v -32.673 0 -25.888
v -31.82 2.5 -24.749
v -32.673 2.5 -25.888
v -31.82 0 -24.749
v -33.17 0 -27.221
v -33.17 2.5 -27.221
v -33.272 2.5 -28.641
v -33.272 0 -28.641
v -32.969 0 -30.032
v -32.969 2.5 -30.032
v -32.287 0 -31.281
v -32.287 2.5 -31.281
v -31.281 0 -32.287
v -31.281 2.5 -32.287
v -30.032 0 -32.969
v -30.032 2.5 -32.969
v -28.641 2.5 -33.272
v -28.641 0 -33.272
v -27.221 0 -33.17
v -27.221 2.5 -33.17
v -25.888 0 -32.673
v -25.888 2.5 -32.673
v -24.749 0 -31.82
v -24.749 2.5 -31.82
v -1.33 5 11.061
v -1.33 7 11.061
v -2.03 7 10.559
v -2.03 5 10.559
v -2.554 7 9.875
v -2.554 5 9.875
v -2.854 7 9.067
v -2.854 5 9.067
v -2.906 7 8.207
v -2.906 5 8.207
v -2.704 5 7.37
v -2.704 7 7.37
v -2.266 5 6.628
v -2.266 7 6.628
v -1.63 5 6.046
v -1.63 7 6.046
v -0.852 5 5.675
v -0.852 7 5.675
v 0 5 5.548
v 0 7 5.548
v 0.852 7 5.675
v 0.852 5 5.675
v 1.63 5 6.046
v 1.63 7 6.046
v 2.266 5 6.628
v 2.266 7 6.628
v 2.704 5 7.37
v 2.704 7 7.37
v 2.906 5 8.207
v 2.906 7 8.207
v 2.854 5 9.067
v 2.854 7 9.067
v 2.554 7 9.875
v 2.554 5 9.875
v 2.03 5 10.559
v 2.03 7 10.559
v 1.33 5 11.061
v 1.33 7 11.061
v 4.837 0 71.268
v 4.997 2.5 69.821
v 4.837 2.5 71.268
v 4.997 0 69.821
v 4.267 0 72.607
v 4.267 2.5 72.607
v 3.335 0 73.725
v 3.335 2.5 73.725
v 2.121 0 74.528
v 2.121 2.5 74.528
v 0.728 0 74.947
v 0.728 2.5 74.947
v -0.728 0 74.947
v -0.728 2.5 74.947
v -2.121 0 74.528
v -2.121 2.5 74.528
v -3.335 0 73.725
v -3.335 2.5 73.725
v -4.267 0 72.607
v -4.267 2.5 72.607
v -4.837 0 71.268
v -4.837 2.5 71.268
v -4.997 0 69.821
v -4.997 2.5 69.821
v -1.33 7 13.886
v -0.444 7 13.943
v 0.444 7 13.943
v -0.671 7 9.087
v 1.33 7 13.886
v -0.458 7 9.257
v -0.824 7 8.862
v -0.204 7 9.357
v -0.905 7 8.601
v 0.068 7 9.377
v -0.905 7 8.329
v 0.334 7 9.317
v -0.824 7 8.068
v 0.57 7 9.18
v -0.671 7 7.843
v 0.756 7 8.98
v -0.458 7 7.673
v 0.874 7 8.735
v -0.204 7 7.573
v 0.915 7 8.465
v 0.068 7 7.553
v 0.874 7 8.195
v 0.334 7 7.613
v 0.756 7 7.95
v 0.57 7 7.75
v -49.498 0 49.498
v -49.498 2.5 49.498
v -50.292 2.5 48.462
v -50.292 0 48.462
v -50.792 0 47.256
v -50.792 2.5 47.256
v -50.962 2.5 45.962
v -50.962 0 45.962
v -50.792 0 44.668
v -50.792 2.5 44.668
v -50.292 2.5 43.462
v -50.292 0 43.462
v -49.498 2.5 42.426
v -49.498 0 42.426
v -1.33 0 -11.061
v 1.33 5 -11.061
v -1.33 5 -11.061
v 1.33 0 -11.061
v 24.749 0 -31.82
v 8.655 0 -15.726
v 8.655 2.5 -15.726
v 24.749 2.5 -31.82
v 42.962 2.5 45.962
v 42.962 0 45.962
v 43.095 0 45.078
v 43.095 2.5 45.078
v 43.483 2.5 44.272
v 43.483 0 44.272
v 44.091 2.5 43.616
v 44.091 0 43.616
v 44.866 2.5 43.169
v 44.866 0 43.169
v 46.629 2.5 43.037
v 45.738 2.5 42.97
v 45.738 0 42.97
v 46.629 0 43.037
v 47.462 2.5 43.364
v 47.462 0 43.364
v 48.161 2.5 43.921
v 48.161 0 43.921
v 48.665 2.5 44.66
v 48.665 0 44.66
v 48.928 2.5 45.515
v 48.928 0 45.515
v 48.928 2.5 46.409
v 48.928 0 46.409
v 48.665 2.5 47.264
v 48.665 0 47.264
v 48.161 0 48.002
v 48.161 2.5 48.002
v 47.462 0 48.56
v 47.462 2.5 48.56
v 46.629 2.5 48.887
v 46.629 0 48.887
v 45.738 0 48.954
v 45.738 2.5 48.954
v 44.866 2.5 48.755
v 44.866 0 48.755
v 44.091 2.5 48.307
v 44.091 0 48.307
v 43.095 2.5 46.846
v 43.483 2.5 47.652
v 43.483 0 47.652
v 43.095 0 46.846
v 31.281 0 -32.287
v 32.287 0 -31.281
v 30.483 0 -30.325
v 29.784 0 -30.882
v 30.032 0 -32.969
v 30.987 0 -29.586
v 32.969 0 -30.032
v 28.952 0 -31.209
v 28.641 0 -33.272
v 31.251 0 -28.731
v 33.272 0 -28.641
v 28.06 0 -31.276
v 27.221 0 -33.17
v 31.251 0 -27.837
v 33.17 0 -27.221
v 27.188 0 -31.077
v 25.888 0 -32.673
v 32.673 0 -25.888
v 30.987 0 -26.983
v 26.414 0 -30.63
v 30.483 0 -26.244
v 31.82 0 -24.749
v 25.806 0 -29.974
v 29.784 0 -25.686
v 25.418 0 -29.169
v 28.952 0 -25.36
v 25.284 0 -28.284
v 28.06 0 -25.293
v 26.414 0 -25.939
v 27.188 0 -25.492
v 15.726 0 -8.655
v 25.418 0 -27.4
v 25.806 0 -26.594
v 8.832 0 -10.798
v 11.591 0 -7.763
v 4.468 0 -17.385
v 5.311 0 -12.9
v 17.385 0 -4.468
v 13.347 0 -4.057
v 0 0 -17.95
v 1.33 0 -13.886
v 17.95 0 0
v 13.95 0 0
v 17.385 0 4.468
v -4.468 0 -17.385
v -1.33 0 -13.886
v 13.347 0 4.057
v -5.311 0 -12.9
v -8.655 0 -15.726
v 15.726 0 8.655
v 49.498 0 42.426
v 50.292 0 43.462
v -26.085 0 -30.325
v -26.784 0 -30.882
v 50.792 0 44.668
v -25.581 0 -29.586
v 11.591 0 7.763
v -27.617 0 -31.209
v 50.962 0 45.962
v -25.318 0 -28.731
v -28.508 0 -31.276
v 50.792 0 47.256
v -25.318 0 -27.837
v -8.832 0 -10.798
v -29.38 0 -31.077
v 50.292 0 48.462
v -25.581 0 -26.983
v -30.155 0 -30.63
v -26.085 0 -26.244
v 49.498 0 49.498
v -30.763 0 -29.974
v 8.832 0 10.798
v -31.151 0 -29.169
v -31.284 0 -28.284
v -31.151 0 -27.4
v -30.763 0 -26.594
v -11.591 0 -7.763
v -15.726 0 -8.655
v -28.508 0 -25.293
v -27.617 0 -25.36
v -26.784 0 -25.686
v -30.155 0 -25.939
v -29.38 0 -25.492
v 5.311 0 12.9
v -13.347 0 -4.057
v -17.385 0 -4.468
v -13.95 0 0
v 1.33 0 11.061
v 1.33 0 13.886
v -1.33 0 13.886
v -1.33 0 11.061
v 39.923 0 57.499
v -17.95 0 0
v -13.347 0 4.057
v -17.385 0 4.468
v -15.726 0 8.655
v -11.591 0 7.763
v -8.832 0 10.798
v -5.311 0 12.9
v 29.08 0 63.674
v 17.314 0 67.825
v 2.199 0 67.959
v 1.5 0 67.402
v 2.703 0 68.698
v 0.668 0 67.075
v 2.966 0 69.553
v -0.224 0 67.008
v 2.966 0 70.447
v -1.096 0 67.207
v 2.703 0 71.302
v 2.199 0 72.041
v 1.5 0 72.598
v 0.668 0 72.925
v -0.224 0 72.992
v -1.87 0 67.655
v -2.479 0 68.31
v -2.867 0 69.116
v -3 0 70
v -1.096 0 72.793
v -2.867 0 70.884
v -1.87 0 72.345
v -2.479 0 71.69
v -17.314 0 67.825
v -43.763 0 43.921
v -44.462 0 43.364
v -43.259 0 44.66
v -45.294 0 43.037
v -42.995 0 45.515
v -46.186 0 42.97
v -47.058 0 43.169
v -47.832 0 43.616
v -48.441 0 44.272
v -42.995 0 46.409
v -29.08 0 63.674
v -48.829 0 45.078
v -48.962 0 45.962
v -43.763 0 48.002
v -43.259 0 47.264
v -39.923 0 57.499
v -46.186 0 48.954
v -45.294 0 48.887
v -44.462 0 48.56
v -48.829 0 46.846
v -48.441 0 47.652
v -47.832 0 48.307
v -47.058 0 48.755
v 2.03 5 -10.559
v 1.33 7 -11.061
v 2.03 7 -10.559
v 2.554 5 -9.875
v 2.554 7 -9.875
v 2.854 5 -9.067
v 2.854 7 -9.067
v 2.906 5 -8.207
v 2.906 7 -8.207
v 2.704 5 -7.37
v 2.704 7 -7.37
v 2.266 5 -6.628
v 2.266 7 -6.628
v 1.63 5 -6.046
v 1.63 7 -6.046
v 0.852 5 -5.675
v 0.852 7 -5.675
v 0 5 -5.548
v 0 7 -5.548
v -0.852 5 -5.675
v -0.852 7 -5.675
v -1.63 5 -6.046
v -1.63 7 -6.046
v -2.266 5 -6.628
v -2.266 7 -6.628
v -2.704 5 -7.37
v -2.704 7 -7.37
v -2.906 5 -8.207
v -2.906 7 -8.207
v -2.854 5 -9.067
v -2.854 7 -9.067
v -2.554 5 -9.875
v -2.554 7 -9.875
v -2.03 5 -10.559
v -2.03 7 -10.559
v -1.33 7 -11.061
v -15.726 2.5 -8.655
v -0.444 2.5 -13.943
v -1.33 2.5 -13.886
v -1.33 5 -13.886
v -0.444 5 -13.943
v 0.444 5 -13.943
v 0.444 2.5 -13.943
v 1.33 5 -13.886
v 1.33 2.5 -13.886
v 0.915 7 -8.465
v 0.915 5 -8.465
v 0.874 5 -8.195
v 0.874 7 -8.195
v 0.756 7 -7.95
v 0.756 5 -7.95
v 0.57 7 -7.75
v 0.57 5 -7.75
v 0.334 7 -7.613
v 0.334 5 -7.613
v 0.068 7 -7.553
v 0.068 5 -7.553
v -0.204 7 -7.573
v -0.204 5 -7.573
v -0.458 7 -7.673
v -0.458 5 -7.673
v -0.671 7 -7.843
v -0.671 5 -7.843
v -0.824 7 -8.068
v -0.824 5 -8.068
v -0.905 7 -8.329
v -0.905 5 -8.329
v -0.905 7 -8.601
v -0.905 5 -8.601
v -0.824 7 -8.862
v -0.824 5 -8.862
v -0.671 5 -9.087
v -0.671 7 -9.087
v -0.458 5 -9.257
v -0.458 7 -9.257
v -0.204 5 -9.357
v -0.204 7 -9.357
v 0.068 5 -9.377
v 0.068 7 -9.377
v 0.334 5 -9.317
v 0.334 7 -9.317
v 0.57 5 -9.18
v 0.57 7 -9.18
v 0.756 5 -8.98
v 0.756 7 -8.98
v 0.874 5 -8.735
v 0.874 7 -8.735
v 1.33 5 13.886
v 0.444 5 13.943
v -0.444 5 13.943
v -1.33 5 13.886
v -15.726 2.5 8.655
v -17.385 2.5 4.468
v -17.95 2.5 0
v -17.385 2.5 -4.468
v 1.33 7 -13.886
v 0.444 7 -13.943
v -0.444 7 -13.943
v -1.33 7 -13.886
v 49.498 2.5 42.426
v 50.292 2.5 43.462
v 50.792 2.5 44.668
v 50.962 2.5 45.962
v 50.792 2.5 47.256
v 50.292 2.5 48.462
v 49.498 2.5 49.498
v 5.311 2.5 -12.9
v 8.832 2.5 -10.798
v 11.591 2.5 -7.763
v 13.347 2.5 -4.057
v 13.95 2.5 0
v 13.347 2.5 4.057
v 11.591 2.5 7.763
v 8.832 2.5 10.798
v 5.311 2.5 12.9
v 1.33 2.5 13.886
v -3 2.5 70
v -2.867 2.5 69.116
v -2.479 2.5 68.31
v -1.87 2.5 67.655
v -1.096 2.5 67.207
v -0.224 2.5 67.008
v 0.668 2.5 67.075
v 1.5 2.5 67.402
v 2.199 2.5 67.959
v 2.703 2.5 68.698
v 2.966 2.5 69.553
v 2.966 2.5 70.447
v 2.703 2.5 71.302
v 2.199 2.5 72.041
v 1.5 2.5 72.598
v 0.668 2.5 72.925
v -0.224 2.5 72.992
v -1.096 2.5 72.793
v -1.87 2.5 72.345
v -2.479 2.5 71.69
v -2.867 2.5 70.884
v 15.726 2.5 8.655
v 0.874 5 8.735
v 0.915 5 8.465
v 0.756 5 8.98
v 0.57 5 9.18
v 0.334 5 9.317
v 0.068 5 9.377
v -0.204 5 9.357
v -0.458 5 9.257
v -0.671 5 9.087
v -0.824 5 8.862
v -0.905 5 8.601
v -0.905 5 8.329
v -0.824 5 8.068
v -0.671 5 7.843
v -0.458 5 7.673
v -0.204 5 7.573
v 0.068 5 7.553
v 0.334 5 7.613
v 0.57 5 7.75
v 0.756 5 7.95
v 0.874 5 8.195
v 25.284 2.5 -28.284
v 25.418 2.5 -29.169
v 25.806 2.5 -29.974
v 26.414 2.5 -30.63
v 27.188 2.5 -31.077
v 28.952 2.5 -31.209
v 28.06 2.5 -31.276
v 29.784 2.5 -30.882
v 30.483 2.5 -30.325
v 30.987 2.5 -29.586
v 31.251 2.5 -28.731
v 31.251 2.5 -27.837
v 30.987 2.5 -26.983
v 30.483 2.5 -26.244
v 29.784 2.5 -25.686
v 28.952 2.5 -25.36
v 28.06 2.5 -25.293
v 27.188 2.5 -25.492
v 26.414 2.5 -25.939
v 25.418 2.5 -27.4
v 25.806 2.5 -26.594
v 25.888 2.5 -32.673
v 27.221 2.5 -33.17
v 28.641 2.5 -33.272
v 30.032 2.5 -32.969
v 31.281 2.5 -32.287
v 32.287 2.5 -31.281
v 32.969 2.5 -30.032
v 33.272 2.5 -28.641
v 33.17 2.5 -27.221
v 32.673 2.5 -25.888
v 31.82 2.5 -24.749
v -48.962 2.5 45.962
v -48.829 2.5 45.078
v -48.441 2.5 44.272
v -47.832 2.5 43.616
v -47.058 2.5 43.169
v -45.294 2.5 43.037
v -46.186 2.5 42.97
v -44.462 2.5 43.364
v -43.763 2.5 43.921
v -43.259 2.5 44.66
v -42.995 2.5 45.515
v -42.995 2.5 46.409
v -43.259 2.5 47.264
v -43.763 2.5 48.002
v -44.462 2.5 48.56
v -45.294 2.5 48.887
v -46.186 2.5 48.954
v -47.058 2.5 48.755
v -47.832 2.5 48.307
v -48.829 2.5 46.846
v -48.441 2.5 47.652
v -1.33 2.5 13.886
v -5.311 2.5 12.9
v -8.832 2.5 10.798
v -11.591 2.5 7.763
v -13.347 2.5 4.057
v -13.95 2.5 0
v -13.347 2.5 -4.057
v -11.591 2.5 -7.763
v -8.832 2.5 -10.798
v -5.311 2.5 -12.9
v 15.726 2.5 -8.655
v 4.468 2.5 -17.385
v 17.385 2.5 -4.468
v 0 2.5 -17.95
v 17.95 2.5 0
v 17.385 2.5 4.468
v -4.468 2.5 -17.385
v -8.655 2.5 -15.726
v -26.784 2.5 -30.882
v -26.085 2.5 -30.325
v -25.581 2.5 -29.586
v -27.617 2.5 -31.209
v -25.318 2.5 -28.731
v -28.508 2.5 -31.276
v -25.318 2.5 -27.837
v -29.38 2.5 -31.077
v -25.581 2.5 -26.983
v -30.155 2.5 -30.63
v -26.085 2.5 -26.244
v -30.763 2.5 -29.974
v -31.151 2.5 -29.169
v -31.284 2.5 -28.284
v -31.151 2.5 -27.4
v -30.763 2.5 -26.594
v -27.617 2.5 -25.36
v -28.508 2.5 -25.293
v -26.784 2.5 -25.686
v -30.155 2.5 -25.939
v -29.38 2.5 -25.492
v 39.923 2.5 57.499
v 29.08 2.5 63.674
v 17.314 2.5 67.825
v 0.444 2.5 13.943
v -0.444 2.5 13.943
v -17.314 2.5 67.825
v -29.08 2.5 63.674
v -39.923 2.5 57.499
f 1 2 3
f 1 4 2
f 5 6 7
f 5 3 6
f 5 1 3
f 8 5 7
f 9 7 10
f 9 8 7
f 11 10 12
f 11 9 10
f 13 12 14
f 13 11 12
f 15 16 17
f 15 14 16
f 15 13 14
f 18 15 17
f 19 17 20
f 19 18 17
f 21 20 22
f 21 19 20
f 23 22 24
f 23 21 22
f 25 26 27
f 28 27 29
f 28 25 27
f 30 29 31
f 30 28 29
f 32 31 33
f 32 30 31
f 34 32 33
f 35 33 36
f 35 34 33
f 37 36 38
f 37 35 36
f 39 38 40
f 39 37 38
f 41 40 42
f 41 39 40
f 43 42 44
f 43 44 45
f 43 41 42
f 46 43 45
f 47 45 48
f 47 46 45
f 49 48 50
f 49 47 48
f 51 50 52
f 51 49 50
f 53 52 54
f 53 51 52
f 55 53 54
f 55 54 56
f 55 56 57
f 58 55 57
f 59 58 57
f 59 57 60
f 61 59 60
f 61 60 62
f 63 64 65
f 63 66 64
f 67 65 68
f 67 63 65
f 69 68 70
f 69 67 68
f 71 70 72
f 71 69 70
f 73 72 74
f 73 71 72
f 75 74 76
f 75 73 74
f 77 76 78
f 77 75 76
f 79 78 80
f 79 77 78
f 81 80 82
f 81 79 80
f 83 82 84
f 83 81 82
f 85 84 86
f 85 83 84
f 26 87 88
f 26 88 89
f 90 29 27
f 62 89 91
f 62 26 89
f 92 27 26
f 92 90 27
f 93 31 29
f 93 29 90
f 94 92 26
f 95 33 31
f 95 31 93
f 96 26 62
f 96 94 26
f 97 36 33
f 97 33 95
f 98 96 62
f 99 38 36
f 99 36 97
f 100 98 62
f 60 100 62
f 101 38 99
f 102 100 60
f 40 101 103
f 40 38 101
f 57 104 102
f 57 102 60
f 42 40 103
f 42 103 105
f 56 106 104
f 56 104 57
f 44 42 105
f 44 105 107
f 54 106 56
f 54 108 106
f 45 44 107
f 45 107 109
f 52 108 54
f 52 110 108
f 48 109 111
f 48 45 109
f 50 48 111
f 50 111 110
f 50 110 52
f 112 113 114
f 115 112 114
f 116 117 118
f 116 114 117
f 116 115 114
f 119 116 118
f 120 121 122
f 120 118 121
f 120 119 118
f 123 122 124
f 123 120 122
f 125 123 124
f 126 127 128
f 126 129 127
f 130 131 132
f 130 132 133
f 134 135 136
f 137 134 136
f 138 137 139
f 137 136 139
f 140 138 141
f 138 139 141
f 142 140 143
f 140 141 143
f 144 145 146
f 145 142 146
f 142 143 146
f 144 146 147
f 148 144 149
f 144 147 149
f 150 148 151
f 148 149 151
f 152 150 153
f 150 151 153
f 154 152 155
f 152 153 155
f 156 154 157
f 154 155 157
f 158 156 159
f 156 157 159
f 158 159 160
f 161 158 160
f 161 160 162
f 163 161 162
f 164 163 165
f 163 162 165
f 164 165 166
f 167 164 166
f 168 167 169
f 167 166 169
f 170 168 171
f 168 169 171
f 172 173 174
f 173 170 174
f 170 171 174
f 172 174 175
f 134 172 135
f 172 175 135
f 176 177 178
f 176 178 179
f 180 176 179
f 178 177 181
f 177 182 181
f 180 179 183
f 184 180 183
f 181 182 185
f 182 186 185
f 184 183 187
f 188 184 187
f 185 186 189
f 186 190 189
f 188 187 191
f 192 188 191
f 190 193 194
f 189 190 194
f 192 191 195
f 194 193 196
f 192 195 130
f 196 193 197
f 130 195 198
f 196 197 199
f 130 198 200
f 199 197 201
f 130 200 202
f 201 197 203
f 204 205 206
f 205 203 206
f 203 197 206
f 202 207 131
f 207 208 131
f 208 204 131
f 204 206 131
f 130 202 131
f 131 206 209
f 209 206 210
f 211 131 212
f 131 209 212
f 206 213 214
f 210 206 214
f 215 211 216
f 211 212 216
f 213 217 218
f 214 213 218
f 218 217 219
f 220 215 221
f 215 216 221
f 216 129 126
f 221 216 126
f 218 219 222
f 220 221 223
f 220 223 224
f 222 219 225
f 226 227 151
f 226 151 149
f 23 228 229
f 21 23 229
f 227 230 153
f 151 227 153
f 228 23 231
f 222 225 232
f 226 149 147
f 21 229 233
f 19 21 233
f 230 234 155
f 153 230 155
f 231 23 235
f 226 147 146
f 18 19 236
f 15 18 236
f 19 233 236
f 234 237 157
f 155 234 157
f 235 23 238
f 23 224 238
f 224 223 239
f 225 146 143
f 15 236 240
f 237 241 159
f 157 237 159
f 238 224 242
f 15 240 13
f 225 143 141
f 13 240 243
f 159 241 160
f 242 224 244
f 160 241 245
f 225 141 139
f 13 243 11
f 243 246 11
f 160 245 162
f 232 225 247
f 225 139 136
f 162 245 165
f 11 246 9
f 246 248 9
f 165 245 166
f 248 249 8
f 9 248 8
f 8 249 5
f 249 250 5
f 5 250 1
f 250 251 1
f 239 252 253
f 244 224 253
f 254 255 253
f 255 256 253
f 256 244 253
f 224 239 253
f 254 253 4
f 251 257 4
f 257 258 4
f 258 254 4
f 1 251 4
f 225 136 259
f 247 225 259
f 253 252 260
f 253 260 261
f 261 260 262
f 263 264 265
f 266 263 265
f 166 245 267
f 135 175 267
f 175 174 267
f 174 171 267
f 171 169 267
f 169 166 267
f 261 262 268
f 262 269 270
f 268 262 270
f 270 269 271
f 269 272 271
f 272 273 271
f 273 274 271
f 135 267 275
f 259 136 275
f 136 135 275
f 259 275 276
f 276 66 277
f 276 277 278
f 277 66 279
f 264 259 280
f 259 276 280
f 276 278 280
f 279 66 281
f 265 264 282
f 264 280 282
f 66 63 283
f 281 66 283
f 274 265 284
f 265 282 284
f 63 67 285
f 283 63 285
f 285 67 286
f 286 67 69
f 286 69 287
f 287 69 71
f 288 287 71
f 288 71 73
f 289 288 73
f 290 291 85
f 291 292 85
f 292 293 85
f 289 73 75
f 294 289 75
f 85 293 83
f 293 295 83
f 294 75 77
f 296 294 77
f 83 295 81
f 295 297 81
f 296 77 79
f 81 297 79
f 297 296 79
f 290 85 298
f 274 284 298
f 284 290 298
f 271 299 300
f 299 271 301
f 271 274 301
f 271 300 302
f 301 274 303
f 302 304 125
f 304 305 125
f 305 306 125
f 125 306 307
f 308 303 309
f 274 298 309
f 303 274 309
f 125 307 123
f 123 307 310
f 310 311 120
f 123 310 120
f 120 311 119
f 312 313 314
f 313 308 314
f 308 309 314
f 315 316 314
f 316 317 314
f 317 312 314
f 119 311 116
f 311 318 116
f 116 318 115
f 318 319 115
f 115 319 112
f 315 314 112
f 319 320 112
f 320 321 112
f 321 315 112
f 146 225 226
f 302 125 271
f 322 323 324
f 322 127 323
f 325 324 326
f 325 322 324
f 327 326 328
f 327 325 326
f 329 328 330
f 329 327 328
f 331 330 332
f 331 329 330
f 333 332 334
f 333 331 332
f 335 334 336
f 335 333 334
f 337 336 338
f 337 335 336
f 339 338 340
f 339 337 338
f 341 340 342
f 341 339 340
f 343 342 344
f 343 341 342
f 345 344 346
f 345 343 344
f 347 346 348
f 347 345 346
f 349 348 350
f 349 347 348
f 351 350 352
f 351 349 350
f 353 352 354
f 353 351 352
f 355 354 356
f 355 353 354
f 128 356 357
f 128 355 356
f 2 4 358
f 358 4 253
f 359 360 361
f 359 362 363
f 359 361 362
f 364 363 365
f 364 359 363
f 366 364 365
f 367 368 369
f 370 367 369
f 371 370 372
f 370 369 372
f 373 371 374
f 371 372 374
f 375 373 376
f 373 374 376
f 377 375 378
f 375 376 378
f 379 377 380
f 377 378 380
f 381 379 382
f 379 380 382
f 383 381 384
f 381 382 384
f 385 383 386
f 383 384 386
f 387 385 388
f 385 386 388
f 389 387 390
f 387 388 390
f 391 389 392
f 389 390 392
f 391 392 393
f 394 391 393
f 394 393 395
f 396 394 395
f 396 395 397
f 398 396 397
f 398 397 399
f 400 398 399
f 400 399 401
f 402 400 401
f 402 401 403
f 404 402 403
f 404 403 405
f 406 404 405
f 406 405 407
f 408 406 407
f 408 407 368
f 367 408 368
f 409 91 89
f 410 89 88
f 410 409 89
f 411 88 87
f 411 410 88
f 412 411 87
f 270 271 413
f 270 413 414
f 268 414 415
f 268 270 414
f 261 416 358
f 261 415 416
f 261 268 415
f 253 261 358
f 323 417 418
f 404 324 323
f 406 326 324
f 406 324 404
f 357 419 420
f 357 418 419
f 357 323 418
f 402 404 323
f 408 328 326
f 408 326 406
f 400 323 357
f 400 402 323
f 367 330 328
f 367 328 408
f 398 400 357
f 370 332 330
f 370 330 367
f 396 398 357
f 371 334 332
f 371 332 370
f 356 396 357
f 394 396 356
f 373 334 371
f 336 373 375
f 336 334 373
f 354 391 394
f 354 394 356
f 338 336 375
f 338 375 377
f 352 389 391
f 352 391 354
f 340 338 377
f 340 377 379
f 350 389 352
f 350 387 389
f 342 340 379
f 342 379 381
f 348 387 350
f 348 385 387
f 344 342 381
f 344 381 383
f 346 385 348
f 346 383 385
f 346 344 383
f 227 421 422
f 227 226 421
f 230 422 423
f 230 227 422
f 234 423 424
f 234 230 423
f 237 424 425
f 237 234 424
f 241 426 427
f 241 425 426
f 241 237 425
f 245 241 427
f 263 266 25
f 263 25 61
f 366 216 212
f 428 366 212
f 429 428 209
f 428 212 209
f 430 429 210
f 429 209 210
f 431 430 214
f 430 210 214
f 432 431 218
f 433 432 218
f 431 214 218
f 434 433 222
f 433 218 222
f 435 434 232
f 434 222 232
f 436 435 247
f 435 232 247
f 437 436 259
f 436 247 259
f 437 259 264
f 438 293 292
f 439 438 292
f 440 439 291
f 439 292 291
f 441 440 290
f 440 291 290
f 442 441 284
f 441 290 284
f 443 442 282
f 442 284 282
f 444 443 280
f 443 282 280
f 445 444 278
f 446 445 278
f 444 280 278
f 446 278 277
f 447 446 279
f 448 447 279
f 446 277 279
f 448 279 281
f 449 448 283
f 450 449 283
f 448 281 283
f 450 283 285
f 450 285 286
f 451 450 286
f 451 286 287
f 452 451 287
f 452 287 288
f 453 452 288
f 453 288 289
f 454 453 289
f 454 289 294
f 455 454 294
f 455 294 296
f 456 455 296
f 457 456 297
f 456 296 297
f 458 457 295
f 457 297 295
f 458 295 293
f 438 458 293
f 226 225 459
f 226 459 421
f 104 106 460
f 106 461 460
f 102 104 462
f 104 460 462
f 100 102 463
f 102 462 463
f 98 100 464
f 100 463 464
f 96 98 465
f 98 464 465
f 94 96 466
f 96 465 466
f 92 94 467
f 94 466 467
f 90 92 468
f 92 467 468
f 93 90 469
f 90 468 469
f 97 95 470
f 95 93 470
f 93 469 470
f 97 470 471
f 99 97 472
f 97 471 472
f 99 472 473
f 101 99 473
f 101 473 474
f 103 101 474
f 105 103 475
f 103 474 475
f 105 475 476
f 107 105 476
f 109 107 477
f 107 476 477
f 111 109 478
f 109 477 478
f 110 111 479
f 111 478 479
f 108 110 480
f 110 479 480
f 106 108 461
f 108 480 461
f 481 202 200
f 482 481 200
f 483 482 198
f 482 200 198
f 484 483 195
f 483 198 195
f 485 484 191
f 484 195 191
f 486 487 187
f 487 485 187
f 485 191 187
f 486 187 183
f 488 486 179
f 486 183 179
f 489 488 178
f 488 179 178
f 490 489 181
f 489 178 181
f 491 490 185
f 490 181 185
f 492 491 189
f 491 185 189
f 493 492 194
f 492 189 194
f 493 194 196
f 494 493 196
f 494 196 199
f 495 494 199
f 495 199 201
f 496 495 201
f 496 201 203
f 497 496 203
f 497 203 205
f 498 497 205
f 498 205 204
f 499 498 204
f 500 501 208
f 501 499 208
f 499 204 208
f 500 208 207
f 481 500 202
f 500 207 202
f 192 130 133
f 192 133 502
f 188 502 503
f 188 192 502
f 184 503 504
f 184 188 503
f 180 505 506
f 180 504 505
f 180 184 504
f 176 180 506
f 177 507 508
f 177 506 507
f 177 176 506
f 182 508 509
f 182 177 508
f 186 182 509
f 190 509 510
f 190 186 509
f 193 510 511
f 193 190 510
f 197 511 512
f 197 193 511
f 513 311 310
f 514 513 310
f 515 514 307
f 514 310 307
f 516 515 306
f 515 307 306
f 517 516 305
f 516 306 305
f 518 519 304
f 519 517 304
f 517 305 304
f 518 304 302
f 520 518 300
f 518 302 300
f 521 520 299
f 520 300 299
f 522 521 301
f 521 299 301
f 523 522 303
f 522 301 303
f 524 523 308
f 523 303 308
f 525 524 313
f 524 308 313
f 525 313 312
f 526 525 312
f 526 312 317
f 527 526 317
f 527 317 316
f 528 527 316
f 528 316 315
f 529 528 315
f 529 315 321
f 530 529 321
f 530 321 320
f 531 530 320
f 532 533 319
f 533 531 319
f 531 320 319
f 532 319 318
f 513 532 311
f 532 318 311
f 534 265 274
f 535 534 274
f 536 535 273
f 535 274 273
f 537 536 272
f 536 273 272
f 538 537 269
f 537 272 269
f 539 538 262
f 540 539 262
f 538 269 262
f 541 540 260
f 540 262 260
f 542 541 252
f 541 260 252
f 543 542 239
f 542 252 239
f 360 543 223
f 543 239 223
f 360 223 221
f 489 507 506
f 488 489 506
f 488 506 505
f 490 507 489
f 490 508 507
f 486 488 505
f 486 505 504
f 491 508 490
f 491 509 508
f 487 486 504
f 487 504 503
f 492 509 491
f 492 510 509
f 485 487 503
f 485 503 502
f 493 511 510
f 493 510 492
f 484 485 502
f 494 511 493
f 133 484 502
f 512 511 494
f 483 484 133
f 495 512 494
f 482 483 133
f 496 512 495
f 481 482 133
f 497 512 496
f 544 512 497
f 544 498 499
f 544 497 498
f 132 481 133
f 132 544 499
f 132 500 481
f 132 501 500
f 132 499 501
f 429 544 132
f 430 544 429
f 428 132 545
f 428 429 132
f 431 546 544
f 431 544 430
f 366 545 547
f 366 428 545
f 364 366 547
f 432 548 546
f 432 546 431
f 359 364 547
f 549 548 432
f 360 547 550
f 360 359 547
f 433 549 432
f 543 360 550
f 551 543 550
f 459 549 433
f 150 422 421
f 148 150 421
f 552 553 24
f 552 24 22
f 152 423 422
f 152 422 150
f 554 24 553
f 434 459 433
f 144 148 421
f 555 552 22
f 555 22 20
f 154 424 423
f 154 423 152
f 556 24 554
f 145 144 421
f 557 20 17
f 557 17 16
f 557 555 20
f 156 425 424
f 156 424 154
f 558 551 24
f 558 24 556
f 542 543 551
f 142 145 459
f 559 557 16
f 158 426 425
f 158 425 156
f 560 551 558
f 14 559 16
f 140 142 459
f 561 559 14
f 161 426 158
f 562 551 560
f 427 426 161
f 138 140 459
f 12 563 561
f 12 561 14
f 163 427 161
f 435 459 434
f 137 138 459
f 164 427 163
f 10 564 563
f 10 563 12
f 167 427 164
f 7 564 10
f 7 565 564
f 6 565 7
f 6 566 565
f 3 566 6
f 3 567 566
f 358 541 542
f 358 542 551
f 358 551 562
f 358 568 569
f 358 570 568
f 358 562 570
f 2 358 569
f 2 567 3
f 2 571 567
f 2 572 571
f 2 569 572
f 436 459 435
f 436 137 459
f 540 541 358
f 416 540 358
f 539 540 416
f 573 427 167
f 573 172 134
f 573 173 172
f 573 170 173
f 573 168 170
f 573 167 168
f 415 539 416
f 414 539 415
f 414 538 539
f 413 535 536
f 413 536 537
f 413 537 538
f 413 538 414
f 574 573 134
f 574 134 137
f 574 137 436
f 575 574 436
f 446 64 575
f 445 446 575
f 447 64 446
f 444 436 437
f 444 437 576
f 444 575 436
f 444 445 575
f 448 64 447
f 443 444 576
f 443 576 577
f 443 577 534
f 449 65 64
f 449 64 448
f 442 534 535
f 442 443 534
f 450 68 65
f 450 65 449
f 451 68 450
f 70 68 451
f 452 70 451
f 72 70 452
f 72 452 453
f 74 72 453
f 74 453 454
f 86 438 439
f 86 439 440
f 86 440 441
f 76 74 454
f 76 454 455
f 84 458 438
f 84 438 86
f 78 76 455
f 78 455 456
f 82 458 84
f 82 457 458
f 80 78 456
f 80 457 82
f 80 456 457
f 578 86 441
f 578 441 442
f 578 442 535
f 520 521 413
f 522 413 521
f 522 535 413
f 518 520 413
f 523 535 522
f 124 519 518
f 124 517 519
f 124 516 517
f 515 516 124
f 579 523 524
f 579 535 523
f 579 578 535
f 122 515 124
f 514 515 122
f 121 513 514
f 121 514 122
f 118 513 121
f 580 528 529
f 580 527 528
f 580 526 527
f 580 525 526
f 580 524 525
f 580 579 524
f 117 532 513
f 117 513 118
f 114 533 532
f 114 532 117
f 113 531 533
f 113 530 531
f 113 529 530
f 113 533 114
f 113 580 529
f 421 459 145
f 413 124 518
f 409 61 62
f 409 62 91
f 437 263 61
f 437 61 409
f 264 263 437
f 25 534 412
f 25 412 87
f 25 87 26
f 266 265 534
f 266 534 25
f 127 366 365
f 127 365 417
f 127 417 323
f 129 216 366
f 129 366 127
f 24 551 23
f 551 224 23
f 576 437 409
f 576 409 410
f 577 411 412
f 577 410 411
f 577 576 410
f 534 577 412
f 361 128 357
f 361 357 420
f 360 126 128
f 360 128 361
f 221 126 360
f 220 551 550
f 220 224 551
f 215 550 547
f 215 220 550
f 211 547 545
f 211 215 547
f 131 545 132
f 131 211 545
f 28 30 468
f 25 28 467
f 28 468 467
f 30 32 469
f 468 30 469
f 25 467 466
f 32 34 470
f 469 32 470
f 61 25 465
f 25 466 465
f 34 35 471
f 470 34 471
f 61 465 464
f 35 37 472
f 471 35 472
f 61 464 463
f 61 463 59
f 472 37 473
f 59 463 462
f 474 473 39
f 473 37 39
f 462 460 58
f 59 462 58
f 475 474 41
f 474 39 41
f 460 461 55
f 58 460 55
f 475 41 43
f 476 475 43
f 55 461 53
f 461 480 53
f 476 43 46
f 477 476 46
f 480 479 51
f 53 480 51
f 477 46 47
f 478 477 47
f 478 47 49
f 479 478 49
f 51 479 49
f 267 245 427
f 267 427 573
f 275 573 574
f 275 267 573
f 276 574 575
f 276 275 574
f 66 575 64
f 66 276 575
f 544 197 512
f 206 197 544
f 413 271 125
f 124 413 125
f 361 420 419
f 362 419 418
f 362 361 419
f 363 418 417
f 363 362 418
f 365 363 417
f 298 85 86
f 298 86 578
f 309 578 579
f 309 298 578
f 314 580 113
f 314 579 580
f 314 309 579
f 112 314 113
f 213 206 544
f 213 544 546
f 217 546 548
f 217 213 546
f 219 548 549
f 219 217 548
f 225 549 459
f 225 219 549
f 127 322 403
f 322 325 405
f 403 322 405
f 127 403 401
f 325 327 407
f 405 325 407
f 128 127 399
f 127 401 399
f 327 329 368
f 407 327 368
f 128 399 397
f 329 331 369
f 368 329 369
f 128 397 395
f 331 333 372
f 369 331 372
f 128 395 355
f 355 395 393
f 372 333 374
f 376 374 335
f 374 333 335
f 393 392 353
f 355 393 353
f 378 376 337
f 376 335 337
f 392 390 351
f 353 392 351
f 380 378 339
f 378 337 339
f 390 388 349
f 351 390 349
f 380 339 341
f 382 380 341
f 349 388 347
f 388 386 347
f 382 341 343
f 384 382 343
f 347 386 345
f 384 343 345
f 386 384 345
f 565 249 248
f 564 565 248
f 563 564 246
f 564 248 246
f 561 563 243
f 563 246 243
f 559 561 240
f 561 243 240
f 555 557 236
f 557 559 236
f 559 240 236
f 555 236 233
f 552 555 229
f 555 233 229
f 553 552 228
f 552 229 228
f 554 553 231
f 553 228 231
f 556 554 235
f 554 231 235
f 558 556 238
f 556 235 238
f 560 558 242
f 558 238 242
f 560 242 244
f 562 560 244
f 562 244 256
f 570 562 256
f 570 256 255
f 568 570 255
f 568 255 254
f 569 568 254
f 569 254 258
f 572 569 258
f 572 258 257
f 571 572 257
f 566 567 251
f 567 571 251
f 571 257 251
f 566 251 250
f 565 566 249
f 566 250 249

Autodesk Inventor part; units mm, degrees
ref_plane "YZ Plane" through (0, 0, 0) normal (1, 0, 0) x (0, 1, 0)
ref_plane "XZ Plane" through (0, 0, 0) normal (0, 1, 0) x (-1, 0, 0)
ref_plane "XY Plane" through (0, 0, 0) normal (0, 0, 1) x (1, 0, 0)
sketch "Sketch1" plane through (0, 0, 0) normal (0, 1, 0) x (-1, 0, 0)
  circle A0 centre (0, 0) radius 13.95
  line L0 (-1.48, 13.8713) -> (-1.48, 10.9113) construction
  line L1 (-1.48, 10.9113) -> (1.48, 10.9113) construction
  line L2 (1.48, 10.9113) -> (1.48, 13.8713) construction
  line L3 (1.33, 13.8865) -> (1.33, 11.0613)
  line L4 (1.33, 11.0613) -> (-1.33, 11.0613)
  line L5 (-1.33, 11.0613) -> (-1.33, 13.8865)
  line L6 (-1.33, -13.8865) -> (-1.33, -11.0613)
  line L7 (-1.33, -11.0613) -> (1.33, -11.0613)
  line L8 (1.33, -11.0613) -> (1.33, -13.8865)
  arc A1 (15.7257, 8.6547) -> (8.6547, -15.7257) centre (0, 0) ccw
  line L9 (0, 0) -> (0, -53.8283) construction
  line L10 (0, 0) -> (-28.2843, -28.2843) construction
  line L11 (0, 0) -> (-45.9619, 45.9619) construction
  line L12 (0, 0) -> (-69.2668, 0) construction
  circle A2 centre (-28.2843, -28.2843) radius 3
  circle A3 centre (-45.9619, 45.9619) radius 3
  line L13 (-8.6547, -15.7257) -> (-24.7487, -31.8198)
  arc A4 (-31.8198, -24.7487) -> (-24.7487, -31.8198) centre (-28.2843, -28.2843) ccw
  line L14 (-31.8198, -24.7487) -> (-15.7257, -8.6547)
  line L15 (-15.7257, 8.6547) -> (-49.4975, 42.4264)
  arc A5 (-49.4975, 49.4975) -> (-49.4975, 42.4264) centre (-45.9619, 45.9619) ccw
  arc A6 (0, 70) -> (-2.9993, 69.9357) centre (0, 0) ccw
  line L16 (0, 70) -> (0, 0) construction
  circle A7 centre (28.2843, -28.2843) radius 3
  circle A8 centre (45.9619, 45.9619) radius 3
  line L17 (8.6547, -15.7257) -> (24.7487, -31.8198)
  arc A9 (24.7487, -31.8198) -> (31.8198, -24.7487) centre (28.2843, -28.2843) ccw
  line L18 (31.8198, -24.7487) -> (15.7257, -8.6547)
  line L19 (15.7257, 8.6547) -> (49.4975, 42.4264)
  arc A10 (49.4975, 42.4264) -> (49.4975, 49.4975) centre (45.9619, 45.9619) ccw
  arc A11 (49.4975, 49.4975) -> (4.9968, 69.8214) centre (0, 0) ccw
  arc A12 (15.7257, -8.6547) -> (15.7257, 8.6547) centre (0, 0) ccw
  arc A13 (8.6547, -15.7257) -> (15.7257, -8.6547) centre (0, 0) ccw
  circle A14 centre (0, 70) radius 3
  circle A15 centre (0, 70) radius 5
  arc A16 (-2.9993, 69.9357) -> (-4.9968, 69.8214) centre (0, 0) ccw
  arc A17 (2.9993, 69.9357) -> (0, 70) centre (0, 0) ccw
  arc A18 (4.9968, 69.8214) -> (2.9993, 69.9357) centre (0, 0) ccw
  arc A19 (-4.9968, 69.8214) -> (-49.4975, 49.4975) centre (0, 0) ccw
  point P0 (0, 10.9113)
  point P1 (0, 11.0613)
  dimension "d0" = 27.9
  dimension "d1" = 2.96
  dimension "d2" = 2.96
  dimension "d3" = 0.15
  dimension "d4" = 0.15
  dimension "d5" = 0.15
  dimension "d7" = 4
  dimension "d8" = 45
  dimension "d9" = 45
  dimension "d10" = 40
  dimension "d11" = 65
  dimension "d12" = 6
  dimension "d13" = 6
  dimension "d14" = 5
  dimension "d15" = 5
  dimension "d17" = 6
  dimension "d18" = 10
extrude "Extrusion1" add sketch "Sketch1" along normal blind 2.5 contours A12 A13 A1 | A1 L15 A5 A19 A15 A11 A10 L19 | L18 A9 L17 A13 | A1 L13 A4 L14 | A18 A14 A16 A15 | A15 A16 A14 A18
extrude "Extrusion2" add sketch "Sketch1" along normal blind 5 contours L3 L4 L5 A0 | A0 L6 L7 L8
sketch "Sketch2" plane through (0, 5, 0) normal (0, 1, 0) x (1, 0, 0)
  circle A0 centre (0, -8.465) radius 0.915
  line L0 (-1.33, -11.0613) -> (-1.33, -13.8865) projected
  arc A1 (-1.33, -13.8865) -> (1.33, -13.8865) centre (0, 0) ccw projected
  line L1 (1.33, -13.8865) -> (1.33, -11.0613) projected
  line L2 (1.33, -11.0613) -> (-1.33, -11.0613) projected
  circle A2 centre (0, -8.465) radius 2.9171
  dimension "d23" = 1.83
  dimension "d24" = 8.465
extrude "Extrusion3" add sketch "Sketch2" along normal blind 2
mirror "Mirror1" about plane through (0, 0, 0) normal (0, 0, 1) of "Extrusion3"
properties part number "Pok Y-Carriage" material "ABS Plastic"
